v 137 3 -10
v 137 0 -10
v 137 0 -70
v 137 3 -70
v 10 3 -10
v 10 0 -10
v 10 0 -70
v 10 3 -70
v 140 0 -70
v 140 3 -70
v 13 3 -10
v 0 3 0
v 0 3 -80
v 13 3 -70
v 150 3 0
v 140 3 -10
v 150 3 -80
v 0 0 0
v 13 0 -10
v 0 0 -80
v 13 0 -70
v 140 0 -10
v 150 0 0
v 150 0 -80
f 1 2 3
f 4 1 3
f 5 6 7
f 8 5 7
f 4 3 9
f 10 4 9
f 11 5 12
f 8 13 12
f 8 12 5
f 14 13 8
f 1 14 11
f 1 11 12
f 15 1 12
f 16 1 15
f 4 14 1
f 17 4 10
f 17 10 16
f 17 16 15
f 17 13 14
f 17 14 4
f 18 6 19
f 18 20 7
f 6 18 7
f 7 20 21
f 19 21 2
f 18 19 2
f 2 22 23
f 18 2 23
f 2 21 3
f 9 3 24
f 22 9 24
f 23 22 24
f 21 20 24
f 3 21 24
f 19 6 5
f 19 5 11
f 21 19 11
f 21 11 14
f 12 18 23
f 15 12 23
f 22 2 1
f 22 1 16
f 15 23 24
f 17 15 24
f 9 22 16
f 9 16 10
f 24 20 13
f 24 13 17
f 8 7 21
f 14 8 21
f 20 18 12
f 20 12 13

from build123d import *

# Parameters (mm, degrees)
SKETCH1_W           = 150
SKETCH1_H           = 80
BOSS_EXTRUDE1_DEPTH = 3
SKETCH2_W           = 3
SKETCH2_H           = 60
CUT_EXTRUDE1_DEPTH  = 10


with BuildPart() as part:
    # Sketch1 → Boss-Extrude1 (new body)
    with BuildSketch(Plane(origin=(0, 0, 0), x_dir=(1, 0, 0), z_dir=(0, 1, 0))):
        with Locations((75, 40)):
            Rectangle(SKETCH1_W, SKETCH1_H)
    extrude(amount=BOSS_EXTRUDE1_DEPTH)

    # Sketch2 → Cut-Extrude1 (cut)
    with BuildSketch(Plane(origin=(0, 0, 0), x_dir=(1, 0, 0), z_dir=(0, 1, 0))):
        with Locations((11.5, 40)):
            Rectangle(SKETCH2_W, SKETCH2_H)
        with Locations((138.5, 40)):
            Rectangle(SKETCH2_W, SKETCH2_H)
    extrude(amount=CUT_EXTRUDE1_DEPTH, mode=Mode.SUBTRACT)


solid = part.part
